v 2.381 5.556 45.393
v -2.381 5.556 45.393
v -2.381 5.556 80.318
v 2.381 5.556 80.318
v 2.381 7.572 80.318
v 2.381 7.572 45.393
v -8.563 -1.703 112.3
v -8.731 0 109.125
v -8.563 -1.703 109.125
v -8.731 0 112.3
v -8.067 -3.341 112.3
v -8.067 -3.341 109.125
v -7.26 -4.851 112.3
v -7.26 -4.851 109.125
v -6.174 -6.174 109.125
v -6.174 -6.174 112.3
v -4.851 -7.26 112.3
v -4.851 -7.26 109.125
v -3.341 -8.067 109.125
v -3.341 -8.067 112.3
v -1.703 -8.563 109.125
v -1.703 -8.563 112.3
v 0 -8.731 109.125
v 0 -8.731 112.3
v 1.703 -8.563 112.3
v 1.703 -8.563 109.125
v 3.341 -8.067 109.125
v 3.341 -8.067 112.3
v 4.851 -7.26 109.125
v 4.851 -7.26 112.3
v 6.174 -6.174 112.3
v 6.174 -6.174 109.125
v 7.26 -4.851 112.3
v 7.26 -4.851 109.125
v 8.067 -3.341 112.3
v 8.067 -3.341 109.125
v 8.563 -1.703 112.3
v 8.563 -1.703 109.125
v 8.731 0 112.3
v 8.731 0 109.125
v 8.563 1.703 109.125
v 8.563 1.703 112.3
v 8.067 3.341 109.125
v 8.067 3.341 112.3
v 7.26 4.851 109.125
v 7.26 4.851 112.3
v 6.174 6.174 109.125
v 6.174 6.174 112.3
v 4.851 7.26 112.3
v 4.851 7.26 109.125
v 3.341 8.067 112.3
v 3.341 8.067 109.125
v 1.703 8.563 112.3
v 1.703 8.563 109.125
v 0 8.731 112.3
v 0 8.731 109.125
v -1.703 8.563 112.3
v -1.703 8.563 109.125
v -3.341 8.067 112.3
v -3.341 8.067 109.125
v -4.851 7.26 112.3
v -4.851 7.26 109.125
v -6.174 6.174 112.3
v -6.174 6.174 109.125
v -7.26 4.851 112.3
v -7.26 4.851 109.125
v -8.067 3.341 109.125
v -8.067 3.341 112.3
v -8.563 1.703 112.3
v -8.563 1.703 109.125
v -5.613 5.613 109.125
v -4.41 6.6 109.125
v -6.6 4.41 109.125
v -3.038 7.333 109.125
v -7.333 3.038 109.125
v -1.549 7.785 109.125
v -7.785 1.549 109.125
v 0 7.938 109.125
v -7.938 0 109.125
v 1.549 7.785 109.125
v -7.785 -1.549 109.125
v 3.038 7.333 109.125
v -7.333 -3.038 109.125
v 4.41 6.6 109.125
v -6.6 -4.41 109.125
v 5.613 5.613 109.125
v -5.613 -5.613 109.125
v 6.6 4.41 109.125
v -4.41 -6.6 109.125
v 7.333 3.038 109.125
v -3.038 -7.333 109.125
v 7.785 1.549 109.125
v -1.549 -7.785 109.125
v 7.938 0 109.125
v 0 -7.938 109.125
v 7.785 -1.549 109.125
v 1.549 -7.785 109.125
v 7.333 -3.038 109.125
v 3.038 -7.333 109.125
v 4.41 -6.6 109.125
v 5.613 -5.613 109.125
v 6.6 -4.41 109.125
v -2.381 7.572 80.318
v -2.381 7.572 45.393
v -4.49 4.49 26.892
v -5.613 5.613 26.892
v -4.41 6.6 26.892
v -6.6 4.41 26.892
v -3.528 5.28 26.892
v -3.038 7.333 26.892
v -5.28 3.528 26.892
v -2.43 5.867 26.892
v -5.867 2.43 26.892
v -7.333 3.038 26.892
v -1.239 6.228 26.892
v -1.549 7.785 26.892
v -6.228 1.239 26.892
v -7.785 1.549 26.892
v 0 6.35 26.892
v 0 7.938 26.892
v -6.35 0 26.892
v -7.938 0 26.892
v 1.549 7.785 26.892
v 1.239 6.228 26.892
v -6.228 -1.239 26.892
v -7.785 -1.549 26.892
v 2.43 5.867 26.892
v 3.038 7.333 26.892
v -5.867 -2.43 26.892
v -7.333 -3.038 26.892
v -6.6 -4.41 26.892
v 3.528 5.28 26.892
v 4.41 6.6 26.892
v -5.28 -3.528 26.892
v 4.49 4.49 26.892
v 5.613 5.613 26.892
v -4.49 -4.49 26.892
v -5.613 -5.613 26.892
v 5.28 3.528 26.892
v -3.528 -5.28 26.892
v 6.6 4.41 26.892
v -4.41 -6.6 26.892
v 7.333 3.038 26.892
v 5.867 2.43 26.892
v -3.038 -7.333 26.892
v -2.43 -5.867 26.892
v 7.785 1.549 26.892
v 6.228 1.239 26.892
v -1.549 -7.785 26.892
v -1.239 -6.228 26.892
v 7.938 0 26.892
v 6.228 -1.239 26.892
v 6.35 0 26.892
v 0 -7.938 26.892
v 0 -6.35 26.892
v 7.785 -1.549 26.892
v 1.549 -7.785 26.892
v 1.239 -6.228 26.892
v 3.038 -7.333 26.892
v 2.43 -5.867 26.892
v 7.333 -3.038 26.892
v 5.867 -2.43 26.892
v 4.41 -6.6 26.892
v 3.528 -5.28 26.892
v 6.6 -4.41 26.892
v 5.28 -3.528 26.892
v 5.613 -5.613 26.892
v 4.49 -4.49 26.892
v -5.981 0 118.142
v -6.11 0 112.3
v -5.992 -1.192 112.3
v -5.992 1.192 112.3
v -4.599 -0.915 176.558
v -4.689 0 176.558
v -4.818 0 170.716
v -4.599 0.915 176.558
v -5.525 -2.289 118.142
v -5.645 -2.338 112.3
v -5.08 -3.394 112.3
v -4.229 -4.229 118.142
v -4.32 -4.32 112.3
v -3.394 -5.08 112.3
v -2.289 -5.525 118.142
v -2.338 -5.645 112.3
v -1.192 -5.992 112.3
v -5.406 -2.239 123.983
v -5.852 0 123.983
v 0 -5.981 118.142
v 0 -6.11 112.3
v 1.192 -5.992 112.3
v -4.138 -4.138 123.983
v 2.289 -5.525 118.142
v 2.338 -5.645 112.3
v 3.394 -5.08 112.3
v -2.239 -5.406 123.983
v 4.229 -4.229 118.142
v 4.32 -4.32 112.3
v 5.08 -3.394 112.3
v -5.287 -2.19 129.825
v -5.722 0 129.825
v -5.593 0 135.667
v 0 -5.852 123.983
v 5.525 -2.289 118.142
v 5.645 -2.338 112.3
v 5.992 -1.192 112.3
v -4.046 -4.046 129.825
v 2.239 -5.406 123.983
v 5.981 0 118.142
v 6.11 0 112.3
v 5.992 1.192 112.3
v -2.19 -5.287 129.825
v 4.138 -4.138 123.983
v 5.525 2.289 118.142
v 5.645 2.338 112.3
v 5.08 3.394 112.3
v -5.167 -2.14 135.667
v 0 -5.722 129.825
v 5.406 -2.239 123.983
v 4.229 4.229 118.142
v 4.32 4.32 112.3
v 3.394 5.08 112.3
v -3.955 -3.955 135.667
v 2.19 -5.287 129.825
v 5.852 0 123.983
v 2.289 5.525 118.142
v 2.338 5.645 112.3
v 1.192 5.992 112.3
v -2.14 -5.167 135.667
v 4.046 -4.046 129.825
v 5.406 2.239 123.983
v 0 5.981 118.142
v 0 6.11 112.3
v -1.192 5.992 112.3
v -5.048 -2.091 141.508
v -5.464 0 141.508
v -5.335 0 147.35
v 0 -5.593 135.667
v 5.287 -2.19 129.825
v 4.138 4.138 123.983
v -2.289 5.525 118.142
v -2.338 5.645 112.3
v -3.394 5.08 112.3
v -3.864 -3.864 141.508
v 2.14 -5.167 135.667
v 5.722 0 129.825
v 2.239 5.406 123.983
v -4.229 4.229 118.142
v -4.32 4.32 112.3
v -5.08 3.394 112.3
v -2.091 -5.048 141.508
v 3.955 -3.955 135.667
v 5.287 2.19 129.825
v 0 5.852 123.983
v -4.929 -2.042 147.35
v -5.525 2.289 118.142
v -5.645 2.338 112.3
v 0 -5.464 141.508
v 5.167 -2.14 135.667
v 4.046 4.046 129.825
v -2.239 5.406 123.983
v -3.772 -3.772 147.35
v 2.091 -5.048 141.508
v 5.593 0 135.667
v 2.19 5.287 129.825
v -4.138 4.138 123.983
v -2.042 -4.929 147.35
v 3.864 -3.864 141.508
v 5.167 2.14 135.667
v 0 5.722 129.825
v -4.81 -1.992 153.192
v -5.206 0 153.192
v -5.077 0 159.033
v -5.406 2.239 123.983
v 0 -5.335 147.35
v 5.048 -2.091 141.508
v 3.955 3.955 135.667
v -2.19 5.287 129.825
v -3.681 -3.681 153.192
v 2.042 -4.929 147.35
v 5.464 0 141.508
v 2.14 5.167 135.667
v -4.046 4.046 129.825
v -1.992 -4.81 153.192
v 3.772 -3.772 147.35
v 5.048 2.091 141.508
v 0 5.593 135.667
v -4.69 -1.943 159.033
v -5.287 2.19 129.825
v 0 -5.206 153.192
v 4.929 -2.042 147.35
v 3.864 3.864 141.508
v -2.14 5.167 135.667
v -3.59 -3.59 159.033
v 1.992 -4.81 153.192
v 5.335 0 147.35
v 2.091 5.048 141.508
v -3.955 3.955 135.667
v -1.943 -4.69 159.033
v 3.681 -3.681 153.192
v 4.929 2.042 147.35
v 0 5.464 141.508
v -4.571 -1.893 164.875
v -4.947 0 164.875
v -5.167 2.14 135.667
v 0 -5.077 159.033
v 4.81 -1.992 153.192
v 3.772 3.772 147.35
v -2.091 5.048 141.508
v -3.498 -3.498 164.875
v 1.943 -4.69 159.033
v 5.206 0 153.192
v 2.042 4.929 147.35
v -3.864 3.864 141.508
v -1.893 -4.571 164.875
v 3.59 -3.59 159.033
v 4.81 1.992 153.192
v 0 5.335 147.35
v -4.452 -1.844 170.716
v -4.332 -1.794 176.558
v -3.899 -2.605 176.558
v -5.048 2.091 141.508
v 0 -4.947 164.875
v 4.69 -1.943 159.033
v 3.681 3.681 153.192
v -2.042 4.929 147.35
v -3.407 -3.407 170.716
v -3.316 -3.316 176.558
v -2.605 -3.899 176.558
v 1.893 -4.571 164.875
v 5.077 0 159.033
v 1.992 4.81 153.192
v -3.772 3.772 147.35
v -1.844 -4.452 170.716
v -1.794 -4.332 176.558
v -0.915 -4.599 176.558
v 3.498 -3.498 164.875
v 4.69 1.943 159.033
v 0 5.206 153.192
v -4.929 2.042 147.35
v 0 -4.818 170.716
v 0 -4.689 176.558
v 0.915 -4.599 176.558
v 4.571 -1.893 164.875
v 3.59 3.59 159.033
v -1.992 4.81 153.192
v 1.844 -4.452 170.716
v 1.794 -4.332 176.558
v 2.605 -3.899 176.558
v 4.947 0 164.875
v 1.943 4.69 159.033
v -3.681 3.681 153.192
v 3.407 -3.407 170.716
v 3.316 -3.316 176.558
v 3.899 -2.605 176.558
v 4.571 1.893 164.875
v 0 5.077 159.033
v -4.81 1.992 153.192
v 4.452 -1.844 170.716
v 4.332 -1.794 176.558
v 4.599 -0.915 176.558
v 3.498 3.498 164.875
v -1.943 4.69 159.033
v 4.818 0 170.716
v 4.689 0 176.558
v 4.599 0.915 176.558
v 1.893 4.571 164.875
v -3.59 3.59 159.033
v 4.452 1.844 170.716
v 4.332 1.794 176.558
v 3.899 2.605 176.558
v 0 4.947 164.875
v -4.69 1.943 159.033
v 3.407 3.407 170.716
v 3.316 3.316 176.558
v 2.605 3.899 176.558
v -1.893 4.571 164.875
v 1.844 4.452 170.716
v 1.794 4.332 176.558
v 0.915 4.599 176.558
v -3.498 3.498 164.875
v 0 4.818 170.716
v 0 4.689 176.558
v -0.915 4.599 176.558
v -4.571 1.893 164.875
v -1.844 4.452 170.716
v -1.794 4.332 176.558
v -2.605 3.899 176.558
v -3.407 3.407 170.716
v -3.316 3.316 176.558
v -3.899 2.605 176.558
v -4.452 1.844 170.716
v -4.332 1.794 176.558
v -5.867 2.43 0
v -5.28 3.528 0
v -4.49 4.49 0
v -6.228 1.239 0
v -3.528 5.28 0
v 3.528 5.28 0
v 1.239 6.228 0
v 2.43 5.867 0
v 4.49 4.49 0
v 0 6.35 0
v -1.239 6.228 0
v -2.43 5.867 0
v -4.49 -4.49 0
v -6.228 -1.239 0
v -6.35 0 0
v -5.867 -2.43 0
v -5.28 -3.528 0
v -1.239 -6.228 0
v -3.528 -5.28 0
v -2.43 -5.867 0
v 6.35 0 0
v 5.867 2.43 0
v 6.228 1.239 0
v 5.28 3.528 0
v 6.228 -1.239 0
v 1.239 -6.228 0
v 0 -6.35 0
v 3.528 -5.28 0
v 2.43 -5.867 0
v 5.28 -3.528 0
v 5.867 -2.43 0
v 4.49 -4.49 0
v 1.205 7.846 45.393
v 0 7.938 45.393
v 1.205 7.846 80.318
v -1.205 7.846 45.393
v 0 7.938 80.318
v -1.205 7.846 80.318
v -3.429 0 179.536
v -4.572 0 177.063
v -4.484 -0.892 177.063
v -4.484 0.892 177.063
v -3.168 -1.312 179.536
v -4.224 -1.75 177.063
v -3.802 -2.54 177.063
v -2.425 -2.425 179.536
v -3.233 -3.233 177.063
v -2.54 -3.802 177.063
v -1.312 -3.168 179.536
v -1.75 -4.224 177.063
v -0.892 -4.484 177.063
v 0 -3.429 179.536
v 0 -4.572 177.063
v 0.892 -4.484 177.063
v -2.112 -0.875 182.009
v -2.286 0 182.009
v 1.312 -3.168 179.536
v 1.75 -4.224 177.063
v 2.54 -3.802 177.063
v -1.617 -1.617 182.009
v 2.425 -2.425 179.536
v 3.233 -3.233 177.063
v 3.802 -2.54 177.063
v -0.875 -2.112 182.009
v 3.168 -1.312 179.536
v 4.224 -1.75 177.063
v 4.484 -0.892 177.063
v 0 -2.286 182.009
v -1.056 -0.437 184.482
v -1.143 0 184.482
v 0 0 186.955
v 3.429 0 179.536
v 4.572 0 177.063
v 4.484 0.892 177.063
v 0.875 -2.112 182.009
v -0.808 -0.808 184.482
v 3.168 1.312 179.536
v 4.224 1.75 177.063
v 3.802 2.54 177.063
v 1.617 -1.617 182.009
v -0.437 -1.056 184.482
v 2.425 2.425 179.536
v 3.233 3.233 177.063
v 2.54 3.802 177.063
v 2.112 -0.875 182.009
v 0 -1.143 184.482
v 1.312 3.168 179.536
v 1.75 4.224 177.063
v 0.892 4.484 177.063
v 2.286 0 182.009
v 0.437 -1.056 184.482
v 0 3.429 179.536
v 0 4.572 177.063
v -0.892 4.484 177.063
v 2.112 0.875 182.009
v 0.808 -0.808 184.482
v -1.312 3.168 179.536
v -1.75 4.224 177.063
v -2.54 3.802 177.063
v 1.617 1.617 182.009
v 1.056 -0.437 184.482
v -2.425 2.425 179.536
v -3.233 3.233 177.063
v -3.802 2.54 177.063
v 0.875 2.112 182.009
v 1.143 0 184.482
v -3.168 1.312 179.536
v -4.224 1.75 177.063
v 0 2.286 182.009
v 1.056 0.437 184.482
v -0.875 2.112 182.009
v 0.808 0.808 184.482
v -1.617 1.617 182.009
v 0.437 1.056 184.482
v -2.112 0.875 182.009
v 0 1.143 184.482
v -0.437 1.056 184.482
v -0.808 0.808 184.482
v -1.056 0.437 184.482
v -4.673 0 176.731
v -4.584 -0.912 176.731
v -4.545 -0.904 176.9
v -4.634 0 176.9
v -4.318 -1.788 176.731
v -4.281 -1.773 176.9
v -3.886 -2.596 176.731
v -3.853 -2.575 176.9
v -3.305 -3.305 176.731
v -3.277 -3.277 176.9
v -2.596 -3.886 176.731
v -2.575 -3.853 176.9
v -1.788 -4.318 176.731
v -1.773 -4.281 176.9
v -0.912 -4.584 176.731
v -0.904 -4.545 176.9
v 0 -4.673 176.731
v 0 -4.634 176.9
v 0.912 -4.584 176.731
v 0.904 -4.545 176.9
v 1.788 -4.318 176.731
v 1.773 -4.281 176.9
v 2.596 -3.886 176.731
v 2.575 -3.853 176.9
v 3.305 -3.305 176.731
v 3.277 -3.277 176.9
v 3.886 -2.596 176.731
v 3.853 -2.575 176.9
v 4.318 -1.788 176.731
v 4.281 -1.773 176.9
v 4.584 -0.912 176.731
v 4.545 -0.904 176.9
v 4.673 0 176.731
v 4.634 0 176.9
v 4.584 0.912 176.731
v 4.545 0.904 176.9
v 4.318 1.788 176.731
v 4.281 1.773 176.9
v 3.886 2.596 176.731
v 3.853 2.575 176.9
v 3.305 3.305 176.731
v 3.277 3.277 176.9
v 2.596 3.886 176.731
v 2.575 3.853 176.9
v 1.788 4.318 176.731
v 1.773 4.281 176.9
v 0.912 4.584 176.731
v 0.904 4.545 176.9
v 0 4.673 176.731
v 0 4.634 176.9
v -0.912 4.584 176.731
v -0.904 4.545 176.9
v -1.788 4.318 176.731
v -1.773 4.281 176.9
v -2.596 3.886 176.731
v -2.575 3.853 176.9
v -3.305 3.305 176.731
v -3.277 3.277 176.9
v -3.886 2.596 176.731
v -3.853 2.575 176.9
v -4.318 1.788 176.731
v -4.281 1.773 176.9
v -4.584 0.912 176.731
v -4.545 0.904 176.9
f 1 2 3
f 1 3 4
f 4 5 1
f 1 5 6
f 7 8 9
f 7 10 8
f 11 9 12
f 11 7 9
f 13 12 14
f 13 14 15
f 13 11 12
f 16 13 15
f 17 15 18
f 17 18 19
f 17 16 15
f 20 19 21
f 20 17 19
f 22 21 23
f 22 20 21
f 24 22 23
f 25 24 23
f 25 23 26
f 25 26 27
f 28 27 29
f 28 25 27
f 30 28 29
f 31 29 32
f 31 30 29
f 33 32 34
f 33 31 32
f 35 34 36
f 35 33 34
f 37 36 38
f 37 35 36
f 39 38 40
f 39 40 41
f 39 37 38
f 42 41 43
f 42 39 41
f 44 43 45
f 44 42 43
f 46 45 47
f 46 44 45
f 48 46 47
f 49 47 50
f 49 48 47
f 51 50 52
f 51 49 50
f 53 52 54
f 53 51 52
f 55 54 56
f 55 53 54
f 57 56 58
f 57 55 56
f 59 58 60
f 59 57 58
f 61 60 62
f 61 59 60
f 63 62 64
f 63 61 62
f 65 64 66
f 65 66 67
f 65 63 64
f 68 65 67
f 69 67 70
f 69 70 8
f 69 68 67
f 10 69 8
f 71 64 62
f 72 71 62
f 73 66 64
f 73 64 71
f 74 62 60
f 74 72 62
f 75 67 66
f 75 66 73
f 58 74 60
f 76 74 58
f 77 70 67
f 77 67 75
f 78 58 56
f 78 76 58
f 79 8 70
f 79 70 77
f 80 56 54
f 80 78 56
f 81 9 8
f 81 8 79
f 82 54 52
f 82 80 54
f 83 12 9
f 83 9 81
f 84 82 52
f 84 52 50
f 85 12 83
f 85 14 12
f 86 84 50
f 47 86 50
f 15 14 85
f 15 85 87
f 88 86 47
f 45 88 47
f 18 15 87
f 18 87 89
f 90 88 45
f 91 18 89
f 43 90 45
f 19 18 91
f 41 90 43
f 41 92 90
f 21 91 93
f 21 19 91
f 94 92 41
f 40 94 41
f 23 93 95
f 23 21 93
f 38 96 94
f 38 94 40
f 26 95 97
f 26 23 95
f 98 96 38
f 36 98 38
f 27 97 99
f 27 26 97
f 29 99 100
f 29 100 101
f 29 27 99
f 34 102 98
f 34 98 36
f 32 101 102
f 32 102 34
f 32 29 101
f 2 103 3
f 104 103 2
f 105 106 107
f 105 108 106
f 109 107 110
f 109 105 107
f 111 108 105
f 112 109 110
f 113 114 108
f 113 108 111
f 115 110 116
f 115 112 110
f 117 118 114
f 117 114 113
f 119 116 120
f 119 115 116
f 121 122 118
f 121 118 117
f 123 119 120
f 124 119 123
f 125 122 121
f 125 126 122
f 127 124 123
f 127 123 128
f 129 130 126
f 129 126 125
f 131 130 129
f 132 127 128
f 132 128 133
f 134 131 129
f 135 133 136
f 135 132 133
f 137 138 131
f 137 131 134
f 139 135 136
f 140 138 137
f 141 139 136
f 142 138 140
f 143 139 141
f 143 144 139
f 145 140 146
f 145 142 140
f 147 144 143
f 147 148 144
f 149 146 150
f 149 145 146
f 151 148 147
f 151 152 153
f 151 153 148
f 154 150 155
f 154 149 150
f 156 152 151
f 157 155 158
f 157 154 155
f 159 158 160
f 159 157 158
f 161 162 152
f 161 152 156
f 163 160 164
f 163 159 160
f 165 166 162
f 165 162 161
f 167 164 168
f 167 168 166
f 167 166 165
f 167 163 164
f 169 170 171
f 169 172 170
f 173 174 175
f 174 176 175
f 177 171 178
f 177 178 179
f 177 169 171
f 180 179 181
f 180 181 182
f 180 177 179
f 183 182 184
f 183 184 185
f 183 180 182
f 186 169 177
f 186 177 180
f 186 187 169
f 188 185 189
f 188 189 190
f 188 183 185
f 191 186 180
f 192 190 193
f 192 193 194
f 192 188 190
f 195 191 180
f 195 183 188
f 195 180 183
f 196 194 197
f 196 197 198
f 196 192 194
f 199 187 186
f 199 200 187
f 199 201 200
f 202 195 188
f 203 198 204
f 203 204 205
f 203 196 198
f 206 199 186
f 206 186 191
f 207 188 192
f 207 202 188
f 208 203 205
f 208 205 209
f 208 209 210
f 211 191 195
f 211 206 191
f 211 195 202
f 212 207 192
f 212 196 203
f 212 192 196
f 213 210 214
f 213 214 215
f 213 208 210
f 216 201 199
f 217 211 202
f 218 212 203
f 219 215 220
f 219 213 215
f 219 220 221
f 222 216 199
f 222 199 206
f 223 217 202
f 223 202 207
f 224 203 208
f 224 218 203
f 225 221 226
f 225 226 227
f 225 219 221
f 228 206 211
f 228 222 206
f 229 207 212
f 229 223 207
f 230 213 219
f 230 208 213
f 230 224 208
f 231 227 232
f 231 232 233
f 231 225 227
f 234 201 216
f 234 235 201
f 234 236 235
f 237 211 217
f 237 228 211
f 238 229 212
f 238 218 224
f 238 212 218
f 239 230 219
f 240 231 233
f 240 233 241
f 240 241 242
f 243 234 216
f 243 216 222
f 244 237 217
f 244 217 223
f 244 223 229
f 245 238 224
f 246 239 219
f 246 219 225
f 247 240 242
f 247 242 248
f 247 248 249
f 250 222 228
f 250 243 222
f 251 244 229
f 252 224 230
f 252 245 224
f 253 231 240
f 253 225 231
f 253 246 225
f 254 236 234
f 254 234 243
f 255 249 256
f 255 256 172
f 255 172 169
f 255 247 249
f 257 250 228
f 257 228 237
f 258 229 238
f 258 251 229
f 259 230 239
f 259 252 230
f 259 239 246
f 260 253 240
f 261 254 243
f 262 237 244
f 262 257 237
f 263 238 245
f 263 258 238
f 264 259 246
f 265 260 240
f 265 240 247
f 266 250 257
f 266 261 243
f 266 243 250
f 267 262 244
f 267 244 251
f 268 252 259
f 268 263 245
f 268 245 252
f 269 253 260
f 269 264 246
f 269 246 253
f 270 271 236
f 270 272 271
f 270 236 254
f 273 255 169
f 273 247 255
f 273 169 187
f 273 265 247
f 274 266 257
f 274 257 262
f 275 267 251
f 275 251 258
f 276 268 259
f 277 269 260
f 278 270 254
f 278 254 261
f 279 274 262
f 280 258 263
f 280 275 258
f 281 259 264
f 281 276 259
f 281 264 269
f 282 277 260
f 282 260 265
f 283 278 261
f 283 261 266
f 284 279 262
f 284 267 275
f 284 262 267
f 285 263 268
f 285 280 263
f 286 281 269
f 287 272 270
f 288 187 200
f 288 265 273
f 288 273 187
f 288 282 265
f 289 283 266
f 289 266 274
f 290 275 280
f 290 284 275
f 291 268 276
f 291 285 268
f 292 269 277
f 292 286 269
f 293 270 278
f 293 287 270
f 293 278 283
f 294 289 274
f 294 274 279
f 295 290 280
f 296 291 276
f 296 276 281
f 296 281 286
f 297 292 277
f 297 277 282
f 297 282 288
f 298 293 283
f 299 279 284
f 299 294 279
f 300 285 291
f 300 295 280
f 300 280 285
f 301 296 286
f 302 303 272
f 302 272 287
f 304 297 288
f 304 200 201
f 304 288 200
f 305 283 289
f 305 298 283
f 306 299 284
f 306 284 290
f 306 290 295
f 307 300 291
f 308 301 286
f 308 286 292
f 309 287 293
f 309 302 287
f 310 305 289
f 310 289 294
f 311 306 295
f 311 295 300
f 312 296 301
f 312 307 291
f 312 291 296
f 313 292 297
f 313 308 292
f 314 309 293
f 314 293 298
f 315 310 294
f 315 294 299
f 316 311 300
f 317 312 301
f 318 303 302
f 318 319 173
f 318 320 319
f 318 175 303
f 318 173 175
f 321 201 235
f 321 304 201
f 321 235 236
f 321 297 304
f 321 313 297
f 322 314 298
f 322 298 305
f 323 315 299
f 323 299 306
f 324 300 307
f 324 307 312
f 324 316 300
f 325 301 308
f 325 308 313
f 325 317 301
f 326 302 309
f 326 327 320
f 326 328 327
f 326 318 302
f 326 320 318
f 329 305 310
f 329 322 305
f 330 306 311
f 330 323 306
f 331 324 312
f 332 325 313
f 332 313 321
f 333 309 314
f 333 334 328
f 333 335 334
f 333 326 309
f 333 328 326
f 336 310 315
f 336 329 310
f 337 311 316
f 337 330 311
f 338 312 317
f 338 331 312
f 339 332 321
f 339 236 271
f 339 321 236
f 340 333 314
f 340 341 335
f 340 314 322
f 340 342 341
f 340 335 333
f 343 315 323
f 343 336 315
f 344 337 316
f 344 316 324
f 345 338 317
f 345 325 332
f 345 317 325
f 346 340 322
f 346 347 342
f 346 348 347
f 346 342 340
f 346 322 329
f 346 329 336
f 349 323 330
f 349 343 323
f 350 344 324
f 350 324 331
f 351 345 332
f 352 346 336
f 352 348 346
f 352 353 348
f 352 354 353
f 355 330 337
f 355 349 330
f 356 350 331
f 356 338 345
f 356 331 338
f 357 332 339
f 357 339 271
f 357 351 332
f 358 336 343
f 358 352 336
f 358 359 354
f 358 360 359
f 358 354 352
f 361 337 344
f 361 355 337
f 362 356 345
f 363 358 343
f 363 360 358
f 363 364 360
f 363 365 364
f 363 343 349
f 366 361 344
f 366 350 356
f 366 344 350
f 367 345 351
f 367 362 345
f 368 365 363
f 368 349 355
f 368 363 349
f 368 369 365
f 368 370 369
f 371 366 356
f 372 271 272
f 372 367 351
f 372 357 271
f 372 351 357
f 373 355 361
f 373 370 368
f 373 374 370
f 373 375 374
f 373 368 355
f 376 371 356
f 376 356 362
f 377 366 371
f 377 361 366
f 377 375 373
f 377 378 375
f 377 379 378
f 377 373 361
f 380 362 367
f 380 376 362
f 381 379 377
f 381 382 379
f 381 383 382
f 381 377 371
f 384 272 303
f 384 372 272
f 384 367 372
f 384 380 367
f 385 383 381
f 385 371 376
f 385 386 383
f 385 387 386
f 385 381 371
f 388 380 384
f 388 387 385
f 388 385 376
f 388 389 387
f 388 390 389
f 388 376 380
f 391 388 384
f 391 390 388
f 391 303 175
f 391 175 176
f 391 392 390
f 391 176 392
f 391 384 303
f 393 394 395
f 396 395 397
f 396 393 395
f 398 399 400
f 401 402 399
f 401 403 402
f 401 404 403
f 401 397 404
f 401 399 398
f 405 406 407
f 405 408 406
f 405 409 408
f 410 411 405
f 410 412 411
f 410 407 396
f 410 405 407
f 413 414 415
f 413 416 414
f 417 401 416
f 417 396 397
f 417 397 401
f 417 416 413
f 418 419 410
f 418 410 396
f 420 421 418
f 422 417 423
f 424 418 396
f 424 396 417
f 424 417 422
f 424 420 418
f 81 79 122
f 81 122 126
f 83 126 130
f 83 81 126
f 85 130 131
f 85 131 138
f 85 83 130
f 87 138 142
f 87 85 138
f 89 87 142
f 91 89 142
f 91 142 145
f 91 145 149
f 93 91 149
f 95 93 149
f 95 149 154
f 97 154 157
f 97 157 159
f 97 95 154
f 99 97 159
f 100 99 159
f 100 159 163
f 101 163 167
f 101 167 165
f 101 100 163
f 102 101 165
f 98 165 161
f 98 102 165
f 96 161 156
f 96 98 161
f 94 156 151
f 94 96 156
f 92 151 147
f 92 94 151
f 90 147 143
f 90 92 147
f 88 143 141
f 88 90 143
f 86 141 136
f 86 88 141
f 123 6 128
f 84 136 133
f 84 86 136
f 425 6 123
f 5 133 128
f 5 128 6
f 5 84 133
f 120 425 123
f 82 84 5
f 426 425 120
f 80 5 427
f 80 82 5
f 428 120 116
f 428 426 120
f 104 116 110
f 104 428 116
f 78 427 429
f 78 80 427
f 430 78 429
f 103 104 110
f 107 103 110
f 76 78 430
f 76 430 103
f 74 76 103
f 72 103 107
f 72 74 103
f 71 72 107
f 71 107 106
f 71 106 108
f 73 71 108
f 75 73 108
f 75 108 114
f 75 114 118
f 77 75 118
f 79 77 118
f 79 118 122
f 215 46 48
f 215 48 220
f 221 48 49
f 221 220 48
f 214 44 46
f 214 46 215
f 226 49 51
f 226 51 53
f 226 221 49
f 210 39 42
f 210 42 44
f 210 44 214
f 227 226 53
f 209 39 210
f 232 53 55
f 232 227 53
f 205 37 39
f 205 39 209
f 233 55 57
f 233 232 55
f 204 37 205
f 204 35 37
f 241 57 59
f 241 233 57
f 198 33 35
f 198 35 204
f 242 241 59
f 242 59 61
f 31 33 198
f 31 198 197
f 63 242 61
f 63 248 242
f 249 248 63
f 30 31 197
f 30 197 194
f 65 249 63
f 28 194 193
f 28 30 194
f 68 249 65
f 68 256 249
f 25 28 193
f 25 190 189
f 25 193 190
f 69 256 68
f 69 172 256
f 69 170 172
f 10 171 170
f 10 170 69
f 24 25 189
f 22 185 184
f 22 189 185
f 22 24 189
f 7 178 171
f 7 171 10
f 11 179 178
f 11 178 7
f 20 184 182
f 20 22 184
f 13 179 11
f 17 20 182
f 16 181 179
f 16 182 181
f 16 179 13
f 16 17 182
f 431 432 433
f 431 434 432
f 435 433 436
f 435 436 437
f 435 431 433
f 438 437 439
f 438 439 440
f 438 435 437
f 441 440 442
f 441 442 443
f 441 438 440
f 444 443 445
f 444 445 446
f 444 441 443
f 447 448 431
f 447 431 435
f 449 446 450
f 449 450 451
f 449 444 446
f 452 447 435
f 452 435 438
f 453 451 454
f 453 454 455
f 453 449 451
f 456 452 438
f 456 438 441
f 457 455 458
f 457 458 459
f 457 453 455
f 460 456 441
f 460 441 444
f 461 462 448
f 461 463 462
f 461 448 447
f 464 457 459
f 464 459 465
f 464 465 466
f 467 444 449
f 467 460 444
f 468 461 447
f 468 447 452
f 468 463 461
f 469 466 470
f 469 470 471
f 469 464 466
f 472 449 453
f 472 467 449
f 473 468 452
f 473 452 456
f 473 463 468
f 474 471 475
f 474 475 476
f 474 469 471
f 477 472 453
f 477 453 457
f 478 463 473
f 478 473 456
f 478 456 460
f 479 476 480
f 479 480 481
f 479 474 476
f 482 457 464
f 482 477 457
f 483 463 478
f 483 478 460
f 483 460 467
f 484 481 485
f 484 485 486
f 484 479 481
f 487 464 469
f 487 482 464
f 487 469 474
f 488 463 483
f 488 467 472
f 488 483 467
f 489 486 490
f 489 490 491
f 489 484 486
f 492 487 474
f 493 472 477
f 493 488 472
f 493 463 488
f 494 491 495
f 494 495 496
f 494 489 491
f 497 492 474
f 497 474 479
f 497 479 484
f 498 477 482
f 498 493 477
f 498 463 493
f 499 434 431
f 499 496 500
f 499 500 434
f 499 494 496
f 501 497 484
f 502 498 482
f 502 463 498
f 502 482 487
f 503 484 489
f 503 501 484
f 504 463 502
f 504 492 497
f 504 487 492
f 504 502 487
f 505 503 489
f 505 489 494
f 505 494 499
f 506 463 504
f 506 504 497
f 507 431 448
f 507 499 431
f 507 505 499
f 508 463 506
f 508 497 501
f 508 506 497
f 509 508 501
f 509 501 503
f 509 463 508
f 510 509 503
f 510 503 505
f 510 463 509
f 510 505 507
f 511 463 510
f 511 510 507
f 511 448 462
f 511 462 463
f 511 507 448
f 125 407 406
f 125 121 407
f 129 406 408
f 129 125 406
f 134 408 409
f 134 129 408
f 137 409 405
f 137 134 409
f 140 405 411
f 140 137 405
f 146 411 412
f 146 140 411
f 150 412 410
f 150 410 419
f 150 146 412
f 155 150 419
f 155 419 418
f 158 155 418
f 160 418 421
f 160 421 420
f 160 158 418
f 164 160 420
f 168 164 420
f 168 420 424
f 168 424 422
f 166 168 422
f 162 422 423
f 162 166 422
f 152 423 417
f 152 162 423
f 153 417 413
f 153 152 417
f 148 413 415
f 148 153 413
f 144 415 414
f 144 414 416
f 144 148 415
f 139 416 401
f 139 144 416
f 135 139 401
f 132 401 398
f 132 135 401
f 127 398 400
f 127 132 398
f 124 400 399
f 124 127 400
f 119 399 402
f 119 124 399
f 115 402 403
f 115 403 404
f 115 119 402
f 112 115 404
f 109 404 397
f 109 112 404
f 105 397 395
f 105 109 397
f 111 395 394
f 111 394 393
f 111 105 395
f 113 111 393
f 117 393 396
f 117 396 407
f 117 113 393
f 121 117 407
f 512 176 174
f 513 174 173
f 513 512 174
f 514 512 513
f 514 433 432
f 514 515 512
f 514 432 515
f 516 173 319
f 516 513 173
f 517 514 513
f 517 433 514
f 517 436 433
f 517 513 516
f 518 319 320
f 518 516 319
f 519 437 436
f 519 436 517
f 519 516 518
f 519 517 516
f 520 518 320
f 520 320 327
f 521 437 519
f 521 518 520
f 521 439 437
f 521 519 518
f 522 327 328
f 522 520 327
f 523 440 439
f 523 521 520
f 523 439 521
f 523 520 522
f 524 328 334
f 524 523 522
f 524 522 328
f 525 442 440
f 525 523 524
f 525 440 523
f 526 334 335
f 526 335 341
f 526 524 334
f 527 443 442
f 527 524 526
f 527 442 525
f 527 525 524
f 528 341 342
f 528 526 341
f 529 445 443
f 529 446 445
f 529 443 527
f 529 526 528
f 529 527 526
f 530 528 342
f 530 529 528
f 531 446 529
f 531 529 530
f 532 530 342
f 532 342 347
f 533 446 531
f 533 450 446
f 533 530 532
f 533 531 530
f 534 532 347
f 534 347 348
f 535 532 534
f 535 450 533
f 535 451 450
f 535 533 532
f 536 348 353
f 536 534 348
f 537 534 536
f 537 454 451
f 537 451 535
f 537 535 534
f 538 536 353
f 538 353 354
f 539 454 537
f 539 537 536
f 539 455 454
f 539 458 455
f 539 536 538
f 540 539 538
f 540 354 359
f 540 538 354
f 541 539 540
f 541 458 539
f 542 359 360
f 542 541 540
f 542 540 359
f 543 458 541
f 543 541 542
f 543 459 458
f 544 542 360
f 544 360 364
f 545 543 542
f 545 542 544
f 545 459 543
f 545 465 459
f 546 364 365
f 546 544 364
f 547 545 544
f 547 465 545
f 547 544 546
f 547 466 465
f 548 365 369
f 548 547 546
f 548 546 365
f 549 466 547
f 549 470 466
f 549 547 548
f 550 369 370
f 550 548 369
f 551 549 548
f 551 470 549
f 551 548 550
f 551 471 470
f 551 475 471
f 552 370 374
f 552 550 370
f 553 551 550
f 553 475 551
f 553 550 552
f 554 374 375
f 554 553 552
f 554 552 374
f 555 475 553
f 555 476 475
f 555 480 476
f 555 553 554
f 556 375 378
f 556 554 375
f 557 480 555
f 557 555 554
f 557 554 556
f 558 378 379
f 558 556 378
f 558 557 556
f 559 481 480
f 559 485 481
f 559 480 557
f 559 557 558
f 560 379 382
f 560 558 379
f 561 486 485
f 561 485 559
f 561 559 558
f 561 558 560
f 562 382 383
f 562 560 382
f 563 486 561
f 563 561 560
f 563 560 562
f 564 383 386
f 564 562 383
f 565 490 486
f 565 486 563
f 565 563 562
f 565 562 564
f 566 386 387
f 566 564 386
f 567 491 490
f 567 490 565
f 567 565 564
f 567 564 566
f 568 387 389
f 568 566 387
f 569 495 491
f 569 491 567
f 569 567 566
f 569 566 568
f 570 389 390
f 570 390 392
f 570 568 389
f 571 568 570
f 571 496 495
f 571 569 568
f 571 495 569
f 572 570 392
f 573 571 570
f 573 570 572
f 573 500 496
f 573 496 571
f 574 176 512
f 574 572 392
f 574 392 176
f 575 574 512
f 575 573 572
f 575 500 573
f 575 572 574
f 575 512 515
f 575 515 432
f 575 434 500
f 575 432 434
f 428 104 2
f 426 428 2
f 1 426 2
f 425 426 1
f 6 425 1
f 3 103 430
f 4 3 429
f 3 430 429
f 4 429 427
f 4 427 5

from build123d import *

# Parameters (mm, degrees)
SKETCH4_W          = 4.7625
SKETCH4_H          = 34.925
CUT_EXTRUDE1_DEPTH = 2.38125


with BuildPart() as part:
    # Sketch3 → Revolve2 (revolve)
    with BuildSketch(Plane(origin=(0, 0, 0), x_dir=(0, 0, -1), z_dir=(1, 0, 0)), mode=Mode.PRIVATE) as revolve2_sk:
        with BuildLine():
            Line((-186.95544175, 0), (-177.8, 0))
            Line((-177.8, 0), (0, 0))
            Line((0, 0), (0, 6.35))
            Line((0, 6.35), (-26.8925, 6.35))
            Line((-26.8925, 6.35), (-26.8925, 7.9375))
            Line((-26.8925, 7.9375), (-109.125, 7.9375))
            Line((-109.125, 7.9375), (-109.125, 8.73125))
            Line((-109.125, 8.73125), (-112.3, 8.73125))
            Line((-112.3, 8.73125), (-112.3, 6.109884817))
            Line((-112.3, 6.109884817), (-176.558072773, 4.689142192))
            ThreePointArc((-176.558072773, 4.689142192), (-176.816471065, 4.656721397), (-177.062823544, 4.572274718))
            Line((-177.062823544, 4.572274718), (-186.95544175, 0))
        make_face()
    revolve(revolve2_sk.sketch.rotate(Axis((0, 0, 0), (0, 0, 1)), 90), axis=Axis((0, 0, 0), (0, 0, 1)))

    # Sketch4 → Cut-Extrude1 (cut)
    with BuildSketch(Plane(origin=(0, 7.9375, 0), x_dir=(1, 0, 0), z_dir=(0, 1, 0))):
        with Locations((0, -62.855066403)):
            Rectangle(SKETCH4_W, SKETCH4_H)
    extrude(amount=-CUT_EXTRUDE1_DEPTH, mode=Mode.SUBTRACT)


solid = part.part
